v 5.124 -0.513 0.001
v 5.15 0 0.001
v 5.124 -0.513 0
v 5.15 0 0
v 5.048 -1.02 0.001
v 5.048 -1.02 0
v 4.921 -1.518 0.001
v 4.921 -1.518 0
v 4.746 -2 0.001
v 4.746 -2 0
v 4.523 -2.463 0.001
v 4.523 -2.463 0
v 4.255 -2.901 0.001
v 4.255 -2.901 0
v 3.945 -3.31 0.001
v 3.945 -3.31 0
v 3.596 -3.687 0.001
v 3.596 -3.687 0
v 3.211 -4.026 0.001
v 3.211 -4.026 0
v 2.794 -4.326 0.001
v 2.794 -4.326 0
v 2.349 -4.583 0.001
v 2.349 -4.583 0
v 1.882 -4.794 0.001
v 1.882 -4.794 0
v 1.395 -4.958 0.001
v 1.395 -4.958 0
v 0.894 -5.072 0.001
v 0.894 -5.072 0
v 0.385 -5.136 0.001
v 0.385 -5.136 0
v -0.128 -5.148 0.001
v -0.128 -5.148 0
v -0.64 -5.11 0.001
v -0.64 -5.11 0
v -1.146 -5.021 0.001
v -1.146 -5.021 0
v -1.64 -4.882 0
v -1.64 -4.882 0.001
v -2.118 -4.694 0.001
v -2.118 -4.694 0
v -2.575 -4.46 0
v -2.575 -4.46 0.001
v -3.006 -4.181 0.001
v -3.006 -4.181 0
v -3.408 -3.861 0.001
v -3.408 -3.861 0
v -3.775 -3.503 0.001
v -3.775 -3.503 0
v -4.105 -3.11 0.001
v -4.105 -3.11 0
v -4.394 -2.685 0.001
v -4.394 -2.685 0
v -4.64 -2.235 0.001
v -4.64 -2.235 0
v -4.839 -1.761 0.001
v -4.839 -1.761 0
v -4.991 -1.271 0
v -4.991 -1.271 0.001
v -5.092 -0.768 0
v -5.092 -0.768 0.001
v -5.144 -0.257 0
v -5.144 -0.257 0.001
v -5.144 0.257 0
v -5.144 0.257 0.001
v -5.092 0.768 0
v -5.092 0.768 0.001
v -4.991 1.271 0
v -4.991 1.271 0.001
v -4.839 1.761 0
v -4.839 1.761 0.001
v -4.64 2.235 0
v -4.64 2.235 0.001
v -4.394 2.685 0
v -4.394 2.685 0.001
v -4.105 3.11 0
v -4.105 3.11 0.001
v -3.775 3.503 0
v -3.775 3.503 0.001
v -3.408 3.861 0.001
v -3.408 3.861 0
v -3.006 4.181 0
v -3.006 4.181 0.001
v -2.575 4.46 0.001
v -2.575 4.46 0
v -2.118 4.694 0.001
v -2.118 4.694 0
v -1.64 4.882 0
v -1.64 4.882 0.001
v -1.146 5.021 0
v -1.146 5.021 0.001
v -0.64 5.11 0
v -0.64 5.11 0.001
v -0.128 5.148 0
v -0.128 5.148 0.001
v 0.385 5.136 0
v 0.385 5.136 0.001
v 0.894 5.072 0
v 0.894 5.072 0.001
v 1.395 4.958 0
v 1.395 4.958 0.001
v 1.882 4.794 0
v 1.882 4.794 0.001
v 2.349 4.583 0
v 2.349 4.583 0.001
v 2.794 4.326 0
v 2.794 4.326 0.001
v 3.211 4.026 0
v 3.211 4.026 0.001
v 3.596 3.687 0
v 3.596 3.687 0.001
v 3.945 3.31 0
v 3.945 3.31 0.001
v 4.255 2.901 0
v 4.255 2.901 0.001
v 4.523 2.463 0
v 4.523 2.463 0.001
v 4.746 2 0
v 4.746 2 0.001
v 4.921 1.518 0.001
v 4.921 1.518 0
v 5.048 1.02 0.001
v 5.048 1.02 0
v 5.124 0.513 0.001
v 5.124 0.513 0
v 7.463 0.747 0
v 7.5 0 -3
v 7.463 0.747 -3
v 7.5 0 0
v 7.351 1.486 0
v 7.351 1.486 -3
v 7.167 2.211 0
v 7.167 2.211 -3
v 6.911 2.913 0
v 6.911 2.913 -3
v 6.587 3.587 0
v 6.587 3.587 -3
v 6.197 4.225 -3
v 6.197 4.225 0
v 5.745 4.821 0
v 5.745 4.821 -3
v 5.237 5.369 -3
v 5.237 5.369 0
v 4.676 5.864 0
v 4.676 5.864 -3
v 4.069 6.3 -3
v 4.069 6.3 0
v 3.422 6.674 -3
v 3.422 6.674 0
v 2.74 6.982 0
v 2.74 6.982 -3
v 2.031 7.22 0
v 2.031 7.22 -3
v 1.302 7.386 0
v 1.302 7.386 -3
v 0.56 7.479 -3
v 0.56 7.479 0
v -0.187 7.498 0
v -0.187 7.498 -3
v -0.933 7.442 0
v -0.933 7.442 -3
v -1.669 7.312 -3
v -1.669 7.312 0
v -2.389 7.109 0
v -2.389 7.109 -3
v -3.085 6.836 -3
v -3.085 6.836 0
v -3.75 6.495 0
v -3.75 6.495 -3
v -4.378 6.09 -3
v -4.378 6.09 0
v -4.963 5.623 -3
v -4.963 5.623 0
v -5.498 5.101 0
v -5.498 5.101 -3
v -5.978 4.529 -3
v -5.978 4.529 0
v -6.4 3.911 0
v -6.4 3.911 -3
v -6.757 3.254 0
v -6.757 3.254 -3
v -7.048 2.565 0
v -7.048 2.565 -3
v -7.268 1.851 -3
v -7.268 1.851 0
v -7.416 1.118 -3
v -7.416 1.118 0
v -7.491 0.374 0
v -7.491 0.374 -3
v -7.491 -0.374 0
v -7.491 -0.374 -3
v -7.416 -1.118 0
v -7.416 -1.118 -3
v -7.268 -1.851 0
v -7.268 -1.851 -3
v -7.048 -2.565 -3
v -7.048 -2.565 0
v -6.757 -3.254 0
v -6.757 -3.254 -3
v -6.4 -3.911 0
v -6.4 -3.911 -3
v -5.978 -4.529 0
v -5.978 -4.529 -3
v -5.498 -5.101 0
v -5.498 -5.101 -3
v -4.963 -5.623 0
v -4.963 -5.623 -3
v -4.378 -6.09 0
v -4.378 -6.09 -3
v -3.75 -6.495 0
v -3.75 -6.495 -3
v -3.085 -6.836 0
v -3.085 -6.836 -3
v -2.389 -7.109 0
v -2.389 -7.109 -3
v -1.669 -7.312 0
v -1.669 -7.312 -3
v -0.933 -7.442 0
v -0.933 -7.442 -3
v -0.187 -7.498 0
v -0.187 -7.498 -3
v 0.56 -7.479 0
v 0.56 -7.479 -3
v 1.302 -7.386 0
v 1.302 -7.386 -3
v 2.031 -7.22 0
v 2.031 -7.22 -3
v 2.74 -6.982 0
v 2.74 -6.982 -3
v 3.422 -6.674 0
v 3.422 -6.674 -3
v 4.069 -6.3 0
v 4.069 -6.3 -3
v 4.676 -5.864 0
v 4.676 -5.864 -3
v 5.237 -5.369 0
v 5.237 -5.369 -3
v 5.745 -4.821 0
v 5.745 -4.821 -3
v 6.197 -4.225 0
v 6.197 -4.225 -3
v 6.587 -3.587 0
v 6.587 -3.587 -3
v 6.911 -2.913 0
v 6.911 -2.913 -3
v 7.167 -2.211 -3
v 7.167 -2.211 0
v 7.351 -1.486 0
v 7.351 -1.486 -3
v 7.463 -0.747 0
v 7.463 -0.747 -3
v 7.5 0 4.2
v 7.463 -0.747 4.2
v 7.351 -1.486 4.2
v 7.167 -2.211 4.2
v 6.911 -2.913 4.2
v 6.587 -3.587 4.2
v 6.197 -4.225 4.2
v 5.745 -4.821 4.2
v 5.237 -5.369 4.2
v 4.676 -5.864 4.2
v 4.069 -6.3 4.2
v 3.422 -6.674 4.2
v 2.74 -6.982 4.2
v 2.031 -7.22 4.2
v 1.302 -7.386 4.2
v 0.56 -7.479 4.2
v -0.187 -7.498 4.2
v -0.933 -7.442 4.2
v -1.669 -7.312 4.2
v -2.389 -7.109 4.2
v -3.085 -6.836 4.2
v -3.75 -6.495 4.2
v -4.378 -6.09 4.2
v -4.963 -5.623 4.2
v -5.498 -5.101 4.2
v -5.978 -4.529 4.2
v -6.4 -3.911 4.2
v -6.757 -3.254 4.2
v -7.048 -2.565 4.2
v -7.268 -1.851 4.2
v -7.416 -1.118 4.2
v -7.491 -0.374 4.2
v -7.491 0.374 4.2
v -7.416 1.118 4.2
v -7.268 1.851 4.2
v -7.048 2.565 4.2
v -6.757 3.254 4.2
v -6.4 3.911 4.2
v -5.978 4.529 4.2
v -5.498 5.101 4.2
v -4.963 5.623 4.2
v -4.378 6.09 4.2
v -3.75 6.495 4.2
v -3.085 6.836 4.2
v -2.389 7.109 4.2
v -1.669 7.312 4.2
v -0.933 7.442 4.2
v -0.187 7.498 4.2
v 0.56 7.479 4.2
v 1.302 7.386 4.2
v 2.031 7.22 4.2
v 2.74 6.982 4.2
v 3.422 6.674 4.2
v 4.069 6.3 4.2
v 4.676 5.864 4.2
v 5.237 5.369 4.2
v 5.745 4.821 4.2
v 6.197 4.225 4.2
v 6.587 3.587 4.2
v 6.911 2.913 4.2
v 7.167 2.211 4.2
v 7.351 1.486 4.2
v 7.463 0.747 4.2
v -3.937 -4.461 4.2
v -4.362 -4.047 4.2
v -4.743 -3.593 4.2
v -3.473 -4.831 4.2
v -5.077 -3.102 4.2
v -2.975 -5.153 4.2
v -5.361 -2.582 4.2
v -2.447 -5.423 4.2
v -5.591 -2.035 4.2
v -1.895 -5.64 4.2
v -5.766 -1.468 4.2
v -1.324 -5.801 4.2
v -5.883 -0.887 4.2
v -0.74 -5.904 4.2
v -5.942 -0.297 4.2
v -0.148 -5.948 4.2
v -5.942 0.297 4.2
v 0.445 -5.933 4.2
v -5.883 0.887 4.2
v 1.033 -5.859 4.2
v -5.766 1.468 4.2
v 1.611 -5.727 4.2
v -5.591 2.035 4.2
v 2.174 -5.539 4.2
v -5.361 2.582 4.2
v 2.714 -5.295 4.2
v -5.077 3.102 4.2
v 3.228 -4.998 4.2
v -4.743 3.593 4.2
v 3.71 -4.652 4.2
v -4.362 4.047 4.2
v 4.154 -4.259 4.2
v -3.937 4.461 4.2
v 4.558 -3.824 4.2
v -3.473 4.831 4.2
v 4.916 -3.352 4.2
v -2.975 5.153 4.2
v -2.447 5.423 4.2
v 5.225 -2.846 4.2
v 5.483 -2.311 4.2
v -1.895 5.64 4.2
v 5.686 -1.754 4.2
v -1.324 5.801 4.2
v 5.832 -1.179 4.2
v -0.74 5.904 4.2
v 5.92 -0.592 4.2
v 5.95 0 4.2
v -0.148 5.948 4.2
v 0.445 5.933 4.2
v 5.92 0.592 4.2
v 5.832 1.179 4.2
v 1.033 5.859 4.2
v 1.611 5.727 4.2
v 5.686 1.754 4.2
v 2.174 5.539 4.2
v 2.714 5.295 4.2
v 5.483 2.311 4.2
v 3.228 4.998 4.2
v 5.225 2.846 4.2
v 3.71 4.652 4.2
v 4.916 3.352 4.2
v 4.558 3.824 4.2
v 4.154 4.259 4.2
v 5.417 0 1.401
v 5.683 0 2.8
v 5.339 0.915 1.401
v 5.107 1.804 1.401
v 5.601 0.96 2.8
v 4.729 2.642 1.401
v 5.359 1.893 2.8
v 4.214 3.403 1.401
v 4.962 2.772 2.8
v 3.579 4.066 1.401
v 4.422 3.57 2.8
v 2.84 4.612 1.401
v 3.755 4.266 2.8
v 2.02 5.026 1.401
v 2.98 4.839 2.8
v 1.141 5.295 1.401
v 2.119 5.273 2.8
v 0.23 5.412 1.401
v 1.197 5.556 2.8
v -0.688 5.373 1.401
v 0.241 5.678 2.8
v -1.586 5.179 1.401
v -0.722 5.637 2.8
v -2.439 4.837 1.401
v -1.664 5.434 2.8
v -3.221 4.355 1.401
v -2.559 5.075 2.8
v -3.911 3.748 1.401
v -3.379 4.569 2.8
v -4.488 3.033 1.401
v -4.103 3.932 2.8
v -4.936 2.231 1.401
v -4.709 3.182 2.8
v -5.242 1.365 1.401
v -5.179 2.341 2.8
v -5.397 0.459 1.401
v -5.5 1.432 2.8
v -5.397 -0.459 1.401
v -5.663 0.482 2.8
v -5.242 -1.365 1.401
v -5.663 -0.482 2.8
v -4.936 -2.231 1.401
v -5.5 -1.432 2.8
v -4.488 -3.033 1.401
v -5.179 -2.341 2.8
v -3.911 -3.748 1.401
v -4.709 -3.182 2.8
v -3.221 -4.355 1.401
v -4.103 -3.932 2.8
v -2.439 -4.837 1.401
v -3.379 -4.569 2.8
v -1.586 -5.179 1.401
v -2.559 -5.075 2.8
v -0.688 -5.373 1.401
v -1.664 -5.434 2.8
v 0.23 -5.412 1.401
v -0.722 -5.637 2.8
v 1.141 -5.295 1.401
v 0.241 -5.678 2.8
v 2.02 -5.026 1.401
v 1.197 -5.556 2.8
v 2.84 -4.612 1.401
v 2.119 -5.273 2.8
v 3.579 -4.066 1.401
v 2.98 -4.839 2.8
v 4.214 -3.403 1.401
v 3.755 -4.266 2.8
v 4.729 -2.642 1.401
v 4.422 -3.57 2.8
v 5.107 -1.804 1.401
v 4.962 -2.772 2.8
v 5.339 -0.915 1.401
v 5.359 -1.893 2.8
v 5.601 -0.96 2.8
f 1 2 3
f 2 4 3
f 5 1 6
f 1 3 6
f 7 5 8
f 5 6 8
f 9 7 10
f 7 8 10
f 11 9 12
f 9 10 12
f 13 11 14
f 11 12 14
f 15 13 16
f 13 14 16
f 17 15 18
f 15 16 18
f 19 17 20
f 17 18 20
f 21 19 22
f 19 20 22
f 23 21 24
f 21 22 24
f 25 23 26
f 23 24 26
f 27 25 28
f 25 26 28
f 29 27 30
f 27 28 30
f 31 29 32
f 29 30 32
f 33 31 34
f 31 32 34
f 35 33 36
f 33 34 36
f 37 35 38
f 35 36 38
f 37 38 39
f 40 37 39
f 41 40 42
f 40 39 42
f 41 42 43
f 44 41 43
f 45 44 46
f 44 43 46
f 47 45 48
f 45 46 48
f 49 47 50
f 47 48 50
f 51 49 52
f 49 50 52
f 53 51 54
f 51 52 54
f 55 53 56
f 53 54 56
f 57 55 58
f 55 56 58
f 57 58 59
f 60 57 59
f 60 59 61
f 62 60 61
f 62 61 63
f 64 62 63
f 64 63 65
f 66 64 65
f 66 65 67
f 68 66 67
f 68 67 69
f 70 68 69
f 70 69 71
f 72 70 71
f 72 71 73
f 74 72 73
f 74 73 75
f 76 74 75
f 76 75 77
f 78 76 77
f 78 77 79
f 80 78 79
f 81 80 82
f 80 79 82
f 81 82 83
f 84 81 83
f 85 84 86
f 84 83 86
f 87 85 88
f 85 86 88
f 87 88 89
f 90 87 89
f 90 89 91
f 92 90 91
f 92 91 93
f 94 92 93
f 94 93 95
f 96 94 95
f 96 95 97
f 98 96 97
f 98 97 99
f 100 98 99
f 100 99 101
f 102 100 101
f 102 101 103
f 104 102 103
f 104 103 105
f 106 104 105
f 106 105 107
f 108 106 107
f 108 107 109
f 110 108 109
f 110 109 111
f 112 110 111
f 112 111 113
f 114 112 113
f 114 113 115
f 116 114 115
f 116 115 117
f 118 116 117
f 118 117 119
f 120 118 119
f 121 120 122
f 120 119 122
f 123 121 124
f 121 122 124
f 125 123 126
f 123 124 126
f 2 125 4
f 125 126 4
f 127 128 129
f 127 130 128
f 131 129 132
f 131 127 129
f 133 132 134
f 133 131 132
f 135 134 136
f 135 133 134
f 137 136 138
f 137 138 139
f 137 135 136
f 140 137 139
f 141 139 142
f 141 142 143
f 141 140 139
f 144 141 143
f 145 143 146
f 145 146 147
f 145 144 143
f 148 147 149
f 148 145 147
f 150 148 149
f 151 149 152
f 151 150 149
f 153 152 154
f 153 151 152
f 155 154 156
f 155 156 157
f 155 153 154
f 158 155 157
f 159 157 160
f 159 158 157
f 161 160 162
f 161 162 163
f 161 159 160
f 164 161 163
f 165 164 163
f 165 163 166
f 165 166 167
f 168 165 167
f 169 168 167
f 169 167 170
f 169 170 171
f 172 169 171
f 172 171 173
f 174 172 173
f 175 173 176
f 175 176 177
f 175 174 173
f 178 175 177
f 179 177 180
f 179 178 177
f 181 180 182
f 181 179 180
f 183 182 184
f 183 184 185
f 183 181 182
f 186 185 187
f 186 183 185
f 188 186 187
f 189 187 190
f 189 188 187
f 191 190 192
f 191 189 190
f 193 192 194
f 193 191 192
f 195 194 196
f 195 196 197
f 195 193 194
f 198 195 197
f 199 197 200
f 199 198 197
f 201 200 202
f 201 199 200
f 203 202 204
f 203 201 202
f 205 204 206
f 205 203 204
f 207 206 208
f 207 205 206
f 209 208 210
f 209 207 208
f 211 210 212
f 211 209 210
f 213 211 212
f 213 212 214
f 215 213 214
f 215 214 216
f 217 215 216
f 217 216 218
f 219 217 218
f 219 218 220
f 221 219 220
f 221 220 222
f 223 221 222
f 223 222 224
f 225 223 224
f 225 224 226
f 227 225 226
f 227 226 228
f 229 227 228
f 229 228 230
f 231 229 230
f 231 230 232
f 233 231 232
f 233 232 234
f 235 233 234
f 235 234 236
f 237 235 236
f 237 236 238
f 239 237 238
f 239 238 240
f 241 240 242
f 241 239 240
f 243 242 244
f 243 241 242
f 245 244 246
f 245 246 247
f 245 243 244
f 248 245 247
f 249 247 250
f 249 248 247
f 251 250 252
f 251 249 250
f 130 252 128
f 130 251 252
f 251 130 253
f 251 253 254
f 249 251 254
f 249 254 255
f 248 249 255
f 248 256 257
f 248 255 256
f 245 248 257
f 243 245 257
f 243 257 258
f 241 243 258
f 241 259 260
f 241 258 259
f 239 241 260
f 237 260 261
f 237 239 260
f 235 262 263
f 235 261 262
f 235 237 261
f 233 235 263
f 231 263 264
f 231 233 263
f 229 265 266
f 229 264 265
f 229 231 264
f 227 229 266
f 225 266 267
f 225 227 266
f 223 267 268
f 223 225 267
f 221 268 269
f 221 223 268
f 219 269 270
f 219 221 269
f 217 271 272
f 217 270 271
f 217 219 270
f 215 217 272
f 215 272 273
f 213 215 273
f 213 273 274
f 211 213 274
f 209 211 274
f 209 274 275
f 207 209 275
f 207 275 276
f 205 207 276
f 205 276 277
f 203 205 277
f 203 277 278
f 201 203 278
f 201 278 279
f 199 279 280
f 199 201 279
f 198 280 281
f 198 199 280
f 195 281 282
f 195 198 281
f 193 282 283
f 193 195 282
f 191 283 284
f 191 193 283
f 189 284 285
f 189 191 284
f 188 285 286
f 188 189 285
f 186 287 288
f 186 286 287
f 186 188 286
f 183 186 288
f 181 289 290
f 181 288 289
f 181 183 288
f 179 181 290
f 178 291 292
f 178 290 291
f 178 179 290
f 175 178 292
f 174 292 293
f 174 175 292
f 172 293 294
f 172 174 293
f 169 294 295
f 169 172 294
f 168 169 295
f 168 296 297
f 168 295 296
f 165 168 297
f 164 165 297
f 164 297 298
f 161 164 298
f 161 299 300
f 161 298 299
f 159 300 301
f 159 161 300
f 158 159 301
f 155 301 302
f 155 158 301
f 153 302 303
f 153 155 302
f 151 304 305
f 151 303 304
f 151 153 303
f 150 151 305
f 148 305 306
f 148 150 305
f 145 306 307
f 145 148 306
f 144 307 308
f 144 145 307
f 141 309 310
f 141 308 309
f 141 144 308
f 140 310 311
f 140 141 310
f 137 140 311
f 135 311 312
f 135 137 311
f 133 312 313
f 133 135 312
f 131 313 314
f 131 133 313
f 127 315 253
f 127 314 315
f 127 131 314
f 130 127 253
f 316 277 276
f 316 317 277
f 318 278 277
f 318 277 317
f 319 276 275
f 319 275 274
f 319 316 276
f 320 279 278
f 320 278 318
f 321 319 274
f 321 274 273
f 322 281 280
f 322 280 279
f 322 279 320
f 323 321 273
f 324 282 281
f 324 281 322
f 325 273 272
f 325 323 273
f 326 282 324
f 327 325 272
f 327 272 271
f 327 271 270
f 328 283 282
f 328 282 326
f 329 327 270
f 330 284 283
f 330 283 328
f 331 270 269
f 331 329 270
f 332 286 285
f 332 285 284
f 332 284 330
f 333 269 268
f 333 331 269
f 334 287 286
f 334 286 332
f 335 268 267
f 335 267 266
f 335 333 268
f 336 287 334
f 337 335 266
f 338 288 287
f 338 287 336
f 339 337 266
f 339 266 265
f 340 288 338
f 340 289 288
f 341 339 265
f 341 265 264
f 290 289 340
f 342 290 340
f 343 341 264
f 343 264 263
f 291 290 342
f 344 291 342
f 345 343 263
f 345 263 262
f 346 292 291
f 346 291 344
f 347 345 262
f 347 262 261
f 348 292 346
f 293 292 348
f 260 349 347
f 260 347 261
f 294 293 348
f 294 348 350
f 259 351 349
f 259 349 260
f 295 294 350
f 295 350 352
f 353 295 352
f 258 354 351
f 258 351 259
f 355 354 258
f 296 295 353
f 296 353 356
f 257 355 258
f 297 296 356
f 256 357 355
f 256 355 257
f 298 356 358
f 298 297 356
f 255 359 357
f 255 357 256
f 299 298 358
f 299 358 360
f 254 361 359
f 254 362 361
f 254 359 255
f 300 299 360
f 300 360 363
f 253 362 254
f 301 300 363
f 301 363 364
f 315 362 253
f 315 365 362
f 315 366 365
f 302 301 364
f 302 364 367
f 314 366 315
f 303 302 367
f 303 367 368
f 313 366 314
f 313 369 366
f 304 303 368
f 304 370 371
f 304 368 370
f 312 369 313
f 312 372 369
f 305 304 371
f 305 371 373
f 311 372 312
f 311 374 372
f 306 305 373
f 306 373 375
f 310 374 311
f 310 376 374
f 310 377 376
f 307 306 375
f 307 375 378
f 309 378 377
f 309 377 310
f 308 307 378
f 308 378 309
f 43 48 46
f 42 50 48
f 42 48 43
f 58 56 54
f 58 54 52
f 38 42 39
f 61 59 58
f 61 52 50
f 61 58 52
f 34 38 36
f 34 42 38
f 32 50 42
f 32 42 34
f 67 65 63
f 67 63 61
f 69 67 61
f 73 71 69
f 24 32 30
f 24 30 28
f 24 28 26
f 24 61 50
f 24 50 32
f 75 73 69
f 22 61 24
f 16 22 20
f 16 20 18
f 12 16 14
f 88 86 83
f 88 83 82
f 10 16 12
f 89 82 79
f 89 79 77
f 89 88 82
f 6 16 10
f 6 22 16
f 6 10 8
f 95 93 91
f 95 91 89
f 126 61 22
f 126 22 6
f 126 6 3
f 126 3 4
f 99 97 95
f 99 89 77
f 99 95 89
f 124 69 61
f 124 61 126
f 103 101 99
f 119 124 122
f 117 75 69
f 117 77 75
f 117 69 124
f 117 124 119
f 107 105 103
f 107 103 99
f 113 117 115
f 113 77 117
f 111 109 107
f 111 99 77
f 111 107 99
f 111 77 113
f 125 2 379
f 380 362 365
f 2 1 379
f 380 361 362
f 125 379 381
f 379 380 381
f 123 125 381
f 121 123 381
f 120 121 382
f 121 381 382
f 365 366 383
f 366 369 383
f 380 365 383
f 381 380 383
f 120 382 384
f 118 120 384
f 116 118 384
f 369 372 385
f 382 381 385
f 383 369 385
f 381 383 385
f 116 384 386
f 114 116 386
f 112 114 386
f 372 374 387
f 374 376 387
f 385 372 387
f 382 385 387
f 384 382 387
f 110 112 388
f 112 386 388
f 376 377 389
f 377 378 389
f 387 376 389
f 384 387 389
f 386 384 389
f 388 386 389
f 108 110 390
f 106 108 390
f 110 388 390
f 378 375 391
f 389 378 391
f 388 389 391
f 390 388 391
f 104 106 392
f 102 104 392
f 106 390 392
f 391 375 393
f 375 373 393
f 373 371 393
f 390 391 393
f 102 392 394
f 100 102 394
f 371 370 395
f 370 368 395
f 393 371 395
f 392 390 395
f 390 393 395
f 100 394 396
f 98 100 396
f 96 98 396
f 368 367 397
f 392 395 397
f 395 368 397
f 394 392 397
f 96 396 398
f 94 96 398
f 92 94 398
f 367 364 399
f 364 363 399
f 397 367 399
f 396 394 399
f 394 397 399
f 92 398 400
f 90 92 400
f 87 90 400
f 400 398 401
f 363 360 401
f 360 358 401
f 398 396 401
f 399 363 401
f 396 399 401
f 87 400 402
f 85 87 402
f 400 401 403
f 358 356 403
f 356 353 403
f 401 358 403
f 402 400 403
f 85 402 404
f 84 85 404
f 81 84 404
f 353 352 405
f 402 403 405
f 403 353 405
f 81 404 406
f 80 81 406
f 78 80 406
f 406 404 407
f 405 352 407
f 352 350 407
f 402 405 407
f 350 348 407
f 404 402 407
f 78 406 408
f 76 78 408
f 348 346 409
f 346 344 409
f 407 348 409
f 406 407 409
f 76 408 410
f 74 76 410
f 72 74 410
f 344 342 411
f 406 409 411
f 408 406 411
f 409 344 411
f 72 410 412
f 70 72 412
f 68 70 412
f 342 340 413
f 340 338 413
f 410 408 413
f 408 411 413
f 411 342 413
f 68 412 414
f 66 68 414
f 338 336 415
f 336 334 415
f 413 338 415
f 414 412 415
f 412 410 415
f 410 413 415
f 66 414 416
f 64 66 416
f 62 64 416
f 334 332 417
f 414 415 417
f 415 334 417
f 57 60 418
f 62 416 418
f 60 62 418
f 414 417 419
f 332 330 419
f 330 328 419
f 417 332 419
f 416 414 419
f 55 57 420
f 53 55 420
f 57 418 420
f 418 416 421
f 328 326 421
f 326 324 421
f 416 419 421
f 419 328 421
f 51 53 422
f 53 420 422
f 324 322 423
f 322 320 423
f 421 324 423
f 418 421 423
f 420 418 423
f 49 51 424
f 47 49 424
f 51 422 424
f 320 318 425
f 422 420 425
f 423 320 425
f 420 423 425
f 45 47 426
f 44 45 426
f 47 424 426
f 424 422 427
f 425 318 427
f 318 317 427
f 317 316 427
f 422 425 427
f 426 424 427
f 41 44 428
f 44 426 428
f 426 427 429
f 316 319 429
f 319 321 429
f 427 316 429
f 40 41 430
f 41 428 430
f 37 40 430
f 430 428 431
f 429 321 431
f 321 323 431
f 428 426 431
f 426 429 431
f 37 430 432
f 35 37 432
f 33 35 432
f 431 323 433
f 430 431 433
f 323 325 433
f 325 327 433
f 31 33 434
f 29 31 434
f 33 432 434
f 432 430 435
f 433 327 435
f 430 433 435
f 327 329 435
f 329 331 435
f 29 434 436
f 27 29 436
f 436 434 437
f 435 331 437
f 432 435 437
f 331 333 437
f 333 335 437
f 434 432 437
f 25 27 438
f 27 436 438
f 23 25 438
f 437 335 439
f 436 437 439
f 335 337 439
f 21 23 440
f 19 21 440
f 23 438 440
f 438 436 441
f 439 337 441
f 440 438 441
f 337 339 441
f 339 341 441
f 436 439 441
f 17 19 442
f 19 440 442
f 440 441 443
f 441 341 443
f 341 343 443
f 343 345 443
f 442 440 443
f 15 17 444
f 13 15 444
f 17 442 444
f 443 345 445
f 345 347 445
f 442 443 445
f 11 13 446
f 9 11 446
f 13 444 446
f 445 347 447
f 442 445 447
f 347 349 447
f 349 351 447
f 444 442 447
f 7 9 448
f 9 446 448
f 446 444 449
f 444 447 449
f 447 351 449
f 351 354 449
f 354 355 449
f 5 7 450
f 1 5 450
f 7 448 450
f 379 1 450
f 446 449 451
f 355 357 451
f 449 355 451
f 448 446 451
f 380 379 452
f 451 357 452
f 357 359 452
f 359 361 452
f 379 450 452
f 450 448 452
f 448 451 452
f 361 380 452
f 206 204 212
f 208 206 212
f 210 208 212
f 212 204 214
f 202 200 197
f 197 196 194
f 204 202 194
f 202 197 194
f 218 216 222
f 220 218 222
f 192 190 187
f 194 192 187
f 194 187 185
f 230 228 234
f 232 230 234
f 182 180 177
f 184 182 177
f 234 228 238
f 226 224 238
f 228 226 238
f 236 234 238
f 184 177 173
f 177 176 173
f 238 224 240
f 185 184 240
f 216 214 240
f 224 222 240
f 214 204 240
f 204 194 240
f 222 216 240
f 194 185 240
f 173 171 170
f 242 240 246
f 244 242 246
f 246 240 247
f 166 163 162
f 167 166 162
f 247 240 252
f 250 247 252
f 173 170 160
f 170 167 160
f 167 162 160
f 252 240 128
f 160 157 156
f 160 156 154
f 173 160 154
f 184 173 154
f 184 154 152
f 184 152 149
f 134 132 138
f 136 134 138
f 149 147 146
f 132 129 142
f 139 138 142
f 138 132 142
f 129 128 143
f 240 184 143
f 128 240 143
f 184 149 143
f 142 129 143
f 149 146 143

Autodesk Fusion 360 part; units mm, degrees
sketch "Sketch1" plane through (0, 0, 0) normal (0, 0, 1) x (1, 0, 0)
  circle A0 centre (0, 0) radius 6
  circle A1 centre (0, 0) radius 7.5
  circle A2 centre (0, 0) radius 5.15
  dimension "d1" = 12
  dimension "d2" = 15
  dimension "d3" = 10.3
extrude "Extrude1" add sketch "Sketch1" along normal blind 4.2 contours A0 | A1
chamfer "Chamfer1" distance 0.8 distance2 4.2 1 edges at (-4.8015, 1.8623, 4.2) measured on face at (6.6696, -0.6285, 4.2)
extrude "Extrude2" add sketch "Sketch1" against normal blind 3 contours A0 | A1 | A2
